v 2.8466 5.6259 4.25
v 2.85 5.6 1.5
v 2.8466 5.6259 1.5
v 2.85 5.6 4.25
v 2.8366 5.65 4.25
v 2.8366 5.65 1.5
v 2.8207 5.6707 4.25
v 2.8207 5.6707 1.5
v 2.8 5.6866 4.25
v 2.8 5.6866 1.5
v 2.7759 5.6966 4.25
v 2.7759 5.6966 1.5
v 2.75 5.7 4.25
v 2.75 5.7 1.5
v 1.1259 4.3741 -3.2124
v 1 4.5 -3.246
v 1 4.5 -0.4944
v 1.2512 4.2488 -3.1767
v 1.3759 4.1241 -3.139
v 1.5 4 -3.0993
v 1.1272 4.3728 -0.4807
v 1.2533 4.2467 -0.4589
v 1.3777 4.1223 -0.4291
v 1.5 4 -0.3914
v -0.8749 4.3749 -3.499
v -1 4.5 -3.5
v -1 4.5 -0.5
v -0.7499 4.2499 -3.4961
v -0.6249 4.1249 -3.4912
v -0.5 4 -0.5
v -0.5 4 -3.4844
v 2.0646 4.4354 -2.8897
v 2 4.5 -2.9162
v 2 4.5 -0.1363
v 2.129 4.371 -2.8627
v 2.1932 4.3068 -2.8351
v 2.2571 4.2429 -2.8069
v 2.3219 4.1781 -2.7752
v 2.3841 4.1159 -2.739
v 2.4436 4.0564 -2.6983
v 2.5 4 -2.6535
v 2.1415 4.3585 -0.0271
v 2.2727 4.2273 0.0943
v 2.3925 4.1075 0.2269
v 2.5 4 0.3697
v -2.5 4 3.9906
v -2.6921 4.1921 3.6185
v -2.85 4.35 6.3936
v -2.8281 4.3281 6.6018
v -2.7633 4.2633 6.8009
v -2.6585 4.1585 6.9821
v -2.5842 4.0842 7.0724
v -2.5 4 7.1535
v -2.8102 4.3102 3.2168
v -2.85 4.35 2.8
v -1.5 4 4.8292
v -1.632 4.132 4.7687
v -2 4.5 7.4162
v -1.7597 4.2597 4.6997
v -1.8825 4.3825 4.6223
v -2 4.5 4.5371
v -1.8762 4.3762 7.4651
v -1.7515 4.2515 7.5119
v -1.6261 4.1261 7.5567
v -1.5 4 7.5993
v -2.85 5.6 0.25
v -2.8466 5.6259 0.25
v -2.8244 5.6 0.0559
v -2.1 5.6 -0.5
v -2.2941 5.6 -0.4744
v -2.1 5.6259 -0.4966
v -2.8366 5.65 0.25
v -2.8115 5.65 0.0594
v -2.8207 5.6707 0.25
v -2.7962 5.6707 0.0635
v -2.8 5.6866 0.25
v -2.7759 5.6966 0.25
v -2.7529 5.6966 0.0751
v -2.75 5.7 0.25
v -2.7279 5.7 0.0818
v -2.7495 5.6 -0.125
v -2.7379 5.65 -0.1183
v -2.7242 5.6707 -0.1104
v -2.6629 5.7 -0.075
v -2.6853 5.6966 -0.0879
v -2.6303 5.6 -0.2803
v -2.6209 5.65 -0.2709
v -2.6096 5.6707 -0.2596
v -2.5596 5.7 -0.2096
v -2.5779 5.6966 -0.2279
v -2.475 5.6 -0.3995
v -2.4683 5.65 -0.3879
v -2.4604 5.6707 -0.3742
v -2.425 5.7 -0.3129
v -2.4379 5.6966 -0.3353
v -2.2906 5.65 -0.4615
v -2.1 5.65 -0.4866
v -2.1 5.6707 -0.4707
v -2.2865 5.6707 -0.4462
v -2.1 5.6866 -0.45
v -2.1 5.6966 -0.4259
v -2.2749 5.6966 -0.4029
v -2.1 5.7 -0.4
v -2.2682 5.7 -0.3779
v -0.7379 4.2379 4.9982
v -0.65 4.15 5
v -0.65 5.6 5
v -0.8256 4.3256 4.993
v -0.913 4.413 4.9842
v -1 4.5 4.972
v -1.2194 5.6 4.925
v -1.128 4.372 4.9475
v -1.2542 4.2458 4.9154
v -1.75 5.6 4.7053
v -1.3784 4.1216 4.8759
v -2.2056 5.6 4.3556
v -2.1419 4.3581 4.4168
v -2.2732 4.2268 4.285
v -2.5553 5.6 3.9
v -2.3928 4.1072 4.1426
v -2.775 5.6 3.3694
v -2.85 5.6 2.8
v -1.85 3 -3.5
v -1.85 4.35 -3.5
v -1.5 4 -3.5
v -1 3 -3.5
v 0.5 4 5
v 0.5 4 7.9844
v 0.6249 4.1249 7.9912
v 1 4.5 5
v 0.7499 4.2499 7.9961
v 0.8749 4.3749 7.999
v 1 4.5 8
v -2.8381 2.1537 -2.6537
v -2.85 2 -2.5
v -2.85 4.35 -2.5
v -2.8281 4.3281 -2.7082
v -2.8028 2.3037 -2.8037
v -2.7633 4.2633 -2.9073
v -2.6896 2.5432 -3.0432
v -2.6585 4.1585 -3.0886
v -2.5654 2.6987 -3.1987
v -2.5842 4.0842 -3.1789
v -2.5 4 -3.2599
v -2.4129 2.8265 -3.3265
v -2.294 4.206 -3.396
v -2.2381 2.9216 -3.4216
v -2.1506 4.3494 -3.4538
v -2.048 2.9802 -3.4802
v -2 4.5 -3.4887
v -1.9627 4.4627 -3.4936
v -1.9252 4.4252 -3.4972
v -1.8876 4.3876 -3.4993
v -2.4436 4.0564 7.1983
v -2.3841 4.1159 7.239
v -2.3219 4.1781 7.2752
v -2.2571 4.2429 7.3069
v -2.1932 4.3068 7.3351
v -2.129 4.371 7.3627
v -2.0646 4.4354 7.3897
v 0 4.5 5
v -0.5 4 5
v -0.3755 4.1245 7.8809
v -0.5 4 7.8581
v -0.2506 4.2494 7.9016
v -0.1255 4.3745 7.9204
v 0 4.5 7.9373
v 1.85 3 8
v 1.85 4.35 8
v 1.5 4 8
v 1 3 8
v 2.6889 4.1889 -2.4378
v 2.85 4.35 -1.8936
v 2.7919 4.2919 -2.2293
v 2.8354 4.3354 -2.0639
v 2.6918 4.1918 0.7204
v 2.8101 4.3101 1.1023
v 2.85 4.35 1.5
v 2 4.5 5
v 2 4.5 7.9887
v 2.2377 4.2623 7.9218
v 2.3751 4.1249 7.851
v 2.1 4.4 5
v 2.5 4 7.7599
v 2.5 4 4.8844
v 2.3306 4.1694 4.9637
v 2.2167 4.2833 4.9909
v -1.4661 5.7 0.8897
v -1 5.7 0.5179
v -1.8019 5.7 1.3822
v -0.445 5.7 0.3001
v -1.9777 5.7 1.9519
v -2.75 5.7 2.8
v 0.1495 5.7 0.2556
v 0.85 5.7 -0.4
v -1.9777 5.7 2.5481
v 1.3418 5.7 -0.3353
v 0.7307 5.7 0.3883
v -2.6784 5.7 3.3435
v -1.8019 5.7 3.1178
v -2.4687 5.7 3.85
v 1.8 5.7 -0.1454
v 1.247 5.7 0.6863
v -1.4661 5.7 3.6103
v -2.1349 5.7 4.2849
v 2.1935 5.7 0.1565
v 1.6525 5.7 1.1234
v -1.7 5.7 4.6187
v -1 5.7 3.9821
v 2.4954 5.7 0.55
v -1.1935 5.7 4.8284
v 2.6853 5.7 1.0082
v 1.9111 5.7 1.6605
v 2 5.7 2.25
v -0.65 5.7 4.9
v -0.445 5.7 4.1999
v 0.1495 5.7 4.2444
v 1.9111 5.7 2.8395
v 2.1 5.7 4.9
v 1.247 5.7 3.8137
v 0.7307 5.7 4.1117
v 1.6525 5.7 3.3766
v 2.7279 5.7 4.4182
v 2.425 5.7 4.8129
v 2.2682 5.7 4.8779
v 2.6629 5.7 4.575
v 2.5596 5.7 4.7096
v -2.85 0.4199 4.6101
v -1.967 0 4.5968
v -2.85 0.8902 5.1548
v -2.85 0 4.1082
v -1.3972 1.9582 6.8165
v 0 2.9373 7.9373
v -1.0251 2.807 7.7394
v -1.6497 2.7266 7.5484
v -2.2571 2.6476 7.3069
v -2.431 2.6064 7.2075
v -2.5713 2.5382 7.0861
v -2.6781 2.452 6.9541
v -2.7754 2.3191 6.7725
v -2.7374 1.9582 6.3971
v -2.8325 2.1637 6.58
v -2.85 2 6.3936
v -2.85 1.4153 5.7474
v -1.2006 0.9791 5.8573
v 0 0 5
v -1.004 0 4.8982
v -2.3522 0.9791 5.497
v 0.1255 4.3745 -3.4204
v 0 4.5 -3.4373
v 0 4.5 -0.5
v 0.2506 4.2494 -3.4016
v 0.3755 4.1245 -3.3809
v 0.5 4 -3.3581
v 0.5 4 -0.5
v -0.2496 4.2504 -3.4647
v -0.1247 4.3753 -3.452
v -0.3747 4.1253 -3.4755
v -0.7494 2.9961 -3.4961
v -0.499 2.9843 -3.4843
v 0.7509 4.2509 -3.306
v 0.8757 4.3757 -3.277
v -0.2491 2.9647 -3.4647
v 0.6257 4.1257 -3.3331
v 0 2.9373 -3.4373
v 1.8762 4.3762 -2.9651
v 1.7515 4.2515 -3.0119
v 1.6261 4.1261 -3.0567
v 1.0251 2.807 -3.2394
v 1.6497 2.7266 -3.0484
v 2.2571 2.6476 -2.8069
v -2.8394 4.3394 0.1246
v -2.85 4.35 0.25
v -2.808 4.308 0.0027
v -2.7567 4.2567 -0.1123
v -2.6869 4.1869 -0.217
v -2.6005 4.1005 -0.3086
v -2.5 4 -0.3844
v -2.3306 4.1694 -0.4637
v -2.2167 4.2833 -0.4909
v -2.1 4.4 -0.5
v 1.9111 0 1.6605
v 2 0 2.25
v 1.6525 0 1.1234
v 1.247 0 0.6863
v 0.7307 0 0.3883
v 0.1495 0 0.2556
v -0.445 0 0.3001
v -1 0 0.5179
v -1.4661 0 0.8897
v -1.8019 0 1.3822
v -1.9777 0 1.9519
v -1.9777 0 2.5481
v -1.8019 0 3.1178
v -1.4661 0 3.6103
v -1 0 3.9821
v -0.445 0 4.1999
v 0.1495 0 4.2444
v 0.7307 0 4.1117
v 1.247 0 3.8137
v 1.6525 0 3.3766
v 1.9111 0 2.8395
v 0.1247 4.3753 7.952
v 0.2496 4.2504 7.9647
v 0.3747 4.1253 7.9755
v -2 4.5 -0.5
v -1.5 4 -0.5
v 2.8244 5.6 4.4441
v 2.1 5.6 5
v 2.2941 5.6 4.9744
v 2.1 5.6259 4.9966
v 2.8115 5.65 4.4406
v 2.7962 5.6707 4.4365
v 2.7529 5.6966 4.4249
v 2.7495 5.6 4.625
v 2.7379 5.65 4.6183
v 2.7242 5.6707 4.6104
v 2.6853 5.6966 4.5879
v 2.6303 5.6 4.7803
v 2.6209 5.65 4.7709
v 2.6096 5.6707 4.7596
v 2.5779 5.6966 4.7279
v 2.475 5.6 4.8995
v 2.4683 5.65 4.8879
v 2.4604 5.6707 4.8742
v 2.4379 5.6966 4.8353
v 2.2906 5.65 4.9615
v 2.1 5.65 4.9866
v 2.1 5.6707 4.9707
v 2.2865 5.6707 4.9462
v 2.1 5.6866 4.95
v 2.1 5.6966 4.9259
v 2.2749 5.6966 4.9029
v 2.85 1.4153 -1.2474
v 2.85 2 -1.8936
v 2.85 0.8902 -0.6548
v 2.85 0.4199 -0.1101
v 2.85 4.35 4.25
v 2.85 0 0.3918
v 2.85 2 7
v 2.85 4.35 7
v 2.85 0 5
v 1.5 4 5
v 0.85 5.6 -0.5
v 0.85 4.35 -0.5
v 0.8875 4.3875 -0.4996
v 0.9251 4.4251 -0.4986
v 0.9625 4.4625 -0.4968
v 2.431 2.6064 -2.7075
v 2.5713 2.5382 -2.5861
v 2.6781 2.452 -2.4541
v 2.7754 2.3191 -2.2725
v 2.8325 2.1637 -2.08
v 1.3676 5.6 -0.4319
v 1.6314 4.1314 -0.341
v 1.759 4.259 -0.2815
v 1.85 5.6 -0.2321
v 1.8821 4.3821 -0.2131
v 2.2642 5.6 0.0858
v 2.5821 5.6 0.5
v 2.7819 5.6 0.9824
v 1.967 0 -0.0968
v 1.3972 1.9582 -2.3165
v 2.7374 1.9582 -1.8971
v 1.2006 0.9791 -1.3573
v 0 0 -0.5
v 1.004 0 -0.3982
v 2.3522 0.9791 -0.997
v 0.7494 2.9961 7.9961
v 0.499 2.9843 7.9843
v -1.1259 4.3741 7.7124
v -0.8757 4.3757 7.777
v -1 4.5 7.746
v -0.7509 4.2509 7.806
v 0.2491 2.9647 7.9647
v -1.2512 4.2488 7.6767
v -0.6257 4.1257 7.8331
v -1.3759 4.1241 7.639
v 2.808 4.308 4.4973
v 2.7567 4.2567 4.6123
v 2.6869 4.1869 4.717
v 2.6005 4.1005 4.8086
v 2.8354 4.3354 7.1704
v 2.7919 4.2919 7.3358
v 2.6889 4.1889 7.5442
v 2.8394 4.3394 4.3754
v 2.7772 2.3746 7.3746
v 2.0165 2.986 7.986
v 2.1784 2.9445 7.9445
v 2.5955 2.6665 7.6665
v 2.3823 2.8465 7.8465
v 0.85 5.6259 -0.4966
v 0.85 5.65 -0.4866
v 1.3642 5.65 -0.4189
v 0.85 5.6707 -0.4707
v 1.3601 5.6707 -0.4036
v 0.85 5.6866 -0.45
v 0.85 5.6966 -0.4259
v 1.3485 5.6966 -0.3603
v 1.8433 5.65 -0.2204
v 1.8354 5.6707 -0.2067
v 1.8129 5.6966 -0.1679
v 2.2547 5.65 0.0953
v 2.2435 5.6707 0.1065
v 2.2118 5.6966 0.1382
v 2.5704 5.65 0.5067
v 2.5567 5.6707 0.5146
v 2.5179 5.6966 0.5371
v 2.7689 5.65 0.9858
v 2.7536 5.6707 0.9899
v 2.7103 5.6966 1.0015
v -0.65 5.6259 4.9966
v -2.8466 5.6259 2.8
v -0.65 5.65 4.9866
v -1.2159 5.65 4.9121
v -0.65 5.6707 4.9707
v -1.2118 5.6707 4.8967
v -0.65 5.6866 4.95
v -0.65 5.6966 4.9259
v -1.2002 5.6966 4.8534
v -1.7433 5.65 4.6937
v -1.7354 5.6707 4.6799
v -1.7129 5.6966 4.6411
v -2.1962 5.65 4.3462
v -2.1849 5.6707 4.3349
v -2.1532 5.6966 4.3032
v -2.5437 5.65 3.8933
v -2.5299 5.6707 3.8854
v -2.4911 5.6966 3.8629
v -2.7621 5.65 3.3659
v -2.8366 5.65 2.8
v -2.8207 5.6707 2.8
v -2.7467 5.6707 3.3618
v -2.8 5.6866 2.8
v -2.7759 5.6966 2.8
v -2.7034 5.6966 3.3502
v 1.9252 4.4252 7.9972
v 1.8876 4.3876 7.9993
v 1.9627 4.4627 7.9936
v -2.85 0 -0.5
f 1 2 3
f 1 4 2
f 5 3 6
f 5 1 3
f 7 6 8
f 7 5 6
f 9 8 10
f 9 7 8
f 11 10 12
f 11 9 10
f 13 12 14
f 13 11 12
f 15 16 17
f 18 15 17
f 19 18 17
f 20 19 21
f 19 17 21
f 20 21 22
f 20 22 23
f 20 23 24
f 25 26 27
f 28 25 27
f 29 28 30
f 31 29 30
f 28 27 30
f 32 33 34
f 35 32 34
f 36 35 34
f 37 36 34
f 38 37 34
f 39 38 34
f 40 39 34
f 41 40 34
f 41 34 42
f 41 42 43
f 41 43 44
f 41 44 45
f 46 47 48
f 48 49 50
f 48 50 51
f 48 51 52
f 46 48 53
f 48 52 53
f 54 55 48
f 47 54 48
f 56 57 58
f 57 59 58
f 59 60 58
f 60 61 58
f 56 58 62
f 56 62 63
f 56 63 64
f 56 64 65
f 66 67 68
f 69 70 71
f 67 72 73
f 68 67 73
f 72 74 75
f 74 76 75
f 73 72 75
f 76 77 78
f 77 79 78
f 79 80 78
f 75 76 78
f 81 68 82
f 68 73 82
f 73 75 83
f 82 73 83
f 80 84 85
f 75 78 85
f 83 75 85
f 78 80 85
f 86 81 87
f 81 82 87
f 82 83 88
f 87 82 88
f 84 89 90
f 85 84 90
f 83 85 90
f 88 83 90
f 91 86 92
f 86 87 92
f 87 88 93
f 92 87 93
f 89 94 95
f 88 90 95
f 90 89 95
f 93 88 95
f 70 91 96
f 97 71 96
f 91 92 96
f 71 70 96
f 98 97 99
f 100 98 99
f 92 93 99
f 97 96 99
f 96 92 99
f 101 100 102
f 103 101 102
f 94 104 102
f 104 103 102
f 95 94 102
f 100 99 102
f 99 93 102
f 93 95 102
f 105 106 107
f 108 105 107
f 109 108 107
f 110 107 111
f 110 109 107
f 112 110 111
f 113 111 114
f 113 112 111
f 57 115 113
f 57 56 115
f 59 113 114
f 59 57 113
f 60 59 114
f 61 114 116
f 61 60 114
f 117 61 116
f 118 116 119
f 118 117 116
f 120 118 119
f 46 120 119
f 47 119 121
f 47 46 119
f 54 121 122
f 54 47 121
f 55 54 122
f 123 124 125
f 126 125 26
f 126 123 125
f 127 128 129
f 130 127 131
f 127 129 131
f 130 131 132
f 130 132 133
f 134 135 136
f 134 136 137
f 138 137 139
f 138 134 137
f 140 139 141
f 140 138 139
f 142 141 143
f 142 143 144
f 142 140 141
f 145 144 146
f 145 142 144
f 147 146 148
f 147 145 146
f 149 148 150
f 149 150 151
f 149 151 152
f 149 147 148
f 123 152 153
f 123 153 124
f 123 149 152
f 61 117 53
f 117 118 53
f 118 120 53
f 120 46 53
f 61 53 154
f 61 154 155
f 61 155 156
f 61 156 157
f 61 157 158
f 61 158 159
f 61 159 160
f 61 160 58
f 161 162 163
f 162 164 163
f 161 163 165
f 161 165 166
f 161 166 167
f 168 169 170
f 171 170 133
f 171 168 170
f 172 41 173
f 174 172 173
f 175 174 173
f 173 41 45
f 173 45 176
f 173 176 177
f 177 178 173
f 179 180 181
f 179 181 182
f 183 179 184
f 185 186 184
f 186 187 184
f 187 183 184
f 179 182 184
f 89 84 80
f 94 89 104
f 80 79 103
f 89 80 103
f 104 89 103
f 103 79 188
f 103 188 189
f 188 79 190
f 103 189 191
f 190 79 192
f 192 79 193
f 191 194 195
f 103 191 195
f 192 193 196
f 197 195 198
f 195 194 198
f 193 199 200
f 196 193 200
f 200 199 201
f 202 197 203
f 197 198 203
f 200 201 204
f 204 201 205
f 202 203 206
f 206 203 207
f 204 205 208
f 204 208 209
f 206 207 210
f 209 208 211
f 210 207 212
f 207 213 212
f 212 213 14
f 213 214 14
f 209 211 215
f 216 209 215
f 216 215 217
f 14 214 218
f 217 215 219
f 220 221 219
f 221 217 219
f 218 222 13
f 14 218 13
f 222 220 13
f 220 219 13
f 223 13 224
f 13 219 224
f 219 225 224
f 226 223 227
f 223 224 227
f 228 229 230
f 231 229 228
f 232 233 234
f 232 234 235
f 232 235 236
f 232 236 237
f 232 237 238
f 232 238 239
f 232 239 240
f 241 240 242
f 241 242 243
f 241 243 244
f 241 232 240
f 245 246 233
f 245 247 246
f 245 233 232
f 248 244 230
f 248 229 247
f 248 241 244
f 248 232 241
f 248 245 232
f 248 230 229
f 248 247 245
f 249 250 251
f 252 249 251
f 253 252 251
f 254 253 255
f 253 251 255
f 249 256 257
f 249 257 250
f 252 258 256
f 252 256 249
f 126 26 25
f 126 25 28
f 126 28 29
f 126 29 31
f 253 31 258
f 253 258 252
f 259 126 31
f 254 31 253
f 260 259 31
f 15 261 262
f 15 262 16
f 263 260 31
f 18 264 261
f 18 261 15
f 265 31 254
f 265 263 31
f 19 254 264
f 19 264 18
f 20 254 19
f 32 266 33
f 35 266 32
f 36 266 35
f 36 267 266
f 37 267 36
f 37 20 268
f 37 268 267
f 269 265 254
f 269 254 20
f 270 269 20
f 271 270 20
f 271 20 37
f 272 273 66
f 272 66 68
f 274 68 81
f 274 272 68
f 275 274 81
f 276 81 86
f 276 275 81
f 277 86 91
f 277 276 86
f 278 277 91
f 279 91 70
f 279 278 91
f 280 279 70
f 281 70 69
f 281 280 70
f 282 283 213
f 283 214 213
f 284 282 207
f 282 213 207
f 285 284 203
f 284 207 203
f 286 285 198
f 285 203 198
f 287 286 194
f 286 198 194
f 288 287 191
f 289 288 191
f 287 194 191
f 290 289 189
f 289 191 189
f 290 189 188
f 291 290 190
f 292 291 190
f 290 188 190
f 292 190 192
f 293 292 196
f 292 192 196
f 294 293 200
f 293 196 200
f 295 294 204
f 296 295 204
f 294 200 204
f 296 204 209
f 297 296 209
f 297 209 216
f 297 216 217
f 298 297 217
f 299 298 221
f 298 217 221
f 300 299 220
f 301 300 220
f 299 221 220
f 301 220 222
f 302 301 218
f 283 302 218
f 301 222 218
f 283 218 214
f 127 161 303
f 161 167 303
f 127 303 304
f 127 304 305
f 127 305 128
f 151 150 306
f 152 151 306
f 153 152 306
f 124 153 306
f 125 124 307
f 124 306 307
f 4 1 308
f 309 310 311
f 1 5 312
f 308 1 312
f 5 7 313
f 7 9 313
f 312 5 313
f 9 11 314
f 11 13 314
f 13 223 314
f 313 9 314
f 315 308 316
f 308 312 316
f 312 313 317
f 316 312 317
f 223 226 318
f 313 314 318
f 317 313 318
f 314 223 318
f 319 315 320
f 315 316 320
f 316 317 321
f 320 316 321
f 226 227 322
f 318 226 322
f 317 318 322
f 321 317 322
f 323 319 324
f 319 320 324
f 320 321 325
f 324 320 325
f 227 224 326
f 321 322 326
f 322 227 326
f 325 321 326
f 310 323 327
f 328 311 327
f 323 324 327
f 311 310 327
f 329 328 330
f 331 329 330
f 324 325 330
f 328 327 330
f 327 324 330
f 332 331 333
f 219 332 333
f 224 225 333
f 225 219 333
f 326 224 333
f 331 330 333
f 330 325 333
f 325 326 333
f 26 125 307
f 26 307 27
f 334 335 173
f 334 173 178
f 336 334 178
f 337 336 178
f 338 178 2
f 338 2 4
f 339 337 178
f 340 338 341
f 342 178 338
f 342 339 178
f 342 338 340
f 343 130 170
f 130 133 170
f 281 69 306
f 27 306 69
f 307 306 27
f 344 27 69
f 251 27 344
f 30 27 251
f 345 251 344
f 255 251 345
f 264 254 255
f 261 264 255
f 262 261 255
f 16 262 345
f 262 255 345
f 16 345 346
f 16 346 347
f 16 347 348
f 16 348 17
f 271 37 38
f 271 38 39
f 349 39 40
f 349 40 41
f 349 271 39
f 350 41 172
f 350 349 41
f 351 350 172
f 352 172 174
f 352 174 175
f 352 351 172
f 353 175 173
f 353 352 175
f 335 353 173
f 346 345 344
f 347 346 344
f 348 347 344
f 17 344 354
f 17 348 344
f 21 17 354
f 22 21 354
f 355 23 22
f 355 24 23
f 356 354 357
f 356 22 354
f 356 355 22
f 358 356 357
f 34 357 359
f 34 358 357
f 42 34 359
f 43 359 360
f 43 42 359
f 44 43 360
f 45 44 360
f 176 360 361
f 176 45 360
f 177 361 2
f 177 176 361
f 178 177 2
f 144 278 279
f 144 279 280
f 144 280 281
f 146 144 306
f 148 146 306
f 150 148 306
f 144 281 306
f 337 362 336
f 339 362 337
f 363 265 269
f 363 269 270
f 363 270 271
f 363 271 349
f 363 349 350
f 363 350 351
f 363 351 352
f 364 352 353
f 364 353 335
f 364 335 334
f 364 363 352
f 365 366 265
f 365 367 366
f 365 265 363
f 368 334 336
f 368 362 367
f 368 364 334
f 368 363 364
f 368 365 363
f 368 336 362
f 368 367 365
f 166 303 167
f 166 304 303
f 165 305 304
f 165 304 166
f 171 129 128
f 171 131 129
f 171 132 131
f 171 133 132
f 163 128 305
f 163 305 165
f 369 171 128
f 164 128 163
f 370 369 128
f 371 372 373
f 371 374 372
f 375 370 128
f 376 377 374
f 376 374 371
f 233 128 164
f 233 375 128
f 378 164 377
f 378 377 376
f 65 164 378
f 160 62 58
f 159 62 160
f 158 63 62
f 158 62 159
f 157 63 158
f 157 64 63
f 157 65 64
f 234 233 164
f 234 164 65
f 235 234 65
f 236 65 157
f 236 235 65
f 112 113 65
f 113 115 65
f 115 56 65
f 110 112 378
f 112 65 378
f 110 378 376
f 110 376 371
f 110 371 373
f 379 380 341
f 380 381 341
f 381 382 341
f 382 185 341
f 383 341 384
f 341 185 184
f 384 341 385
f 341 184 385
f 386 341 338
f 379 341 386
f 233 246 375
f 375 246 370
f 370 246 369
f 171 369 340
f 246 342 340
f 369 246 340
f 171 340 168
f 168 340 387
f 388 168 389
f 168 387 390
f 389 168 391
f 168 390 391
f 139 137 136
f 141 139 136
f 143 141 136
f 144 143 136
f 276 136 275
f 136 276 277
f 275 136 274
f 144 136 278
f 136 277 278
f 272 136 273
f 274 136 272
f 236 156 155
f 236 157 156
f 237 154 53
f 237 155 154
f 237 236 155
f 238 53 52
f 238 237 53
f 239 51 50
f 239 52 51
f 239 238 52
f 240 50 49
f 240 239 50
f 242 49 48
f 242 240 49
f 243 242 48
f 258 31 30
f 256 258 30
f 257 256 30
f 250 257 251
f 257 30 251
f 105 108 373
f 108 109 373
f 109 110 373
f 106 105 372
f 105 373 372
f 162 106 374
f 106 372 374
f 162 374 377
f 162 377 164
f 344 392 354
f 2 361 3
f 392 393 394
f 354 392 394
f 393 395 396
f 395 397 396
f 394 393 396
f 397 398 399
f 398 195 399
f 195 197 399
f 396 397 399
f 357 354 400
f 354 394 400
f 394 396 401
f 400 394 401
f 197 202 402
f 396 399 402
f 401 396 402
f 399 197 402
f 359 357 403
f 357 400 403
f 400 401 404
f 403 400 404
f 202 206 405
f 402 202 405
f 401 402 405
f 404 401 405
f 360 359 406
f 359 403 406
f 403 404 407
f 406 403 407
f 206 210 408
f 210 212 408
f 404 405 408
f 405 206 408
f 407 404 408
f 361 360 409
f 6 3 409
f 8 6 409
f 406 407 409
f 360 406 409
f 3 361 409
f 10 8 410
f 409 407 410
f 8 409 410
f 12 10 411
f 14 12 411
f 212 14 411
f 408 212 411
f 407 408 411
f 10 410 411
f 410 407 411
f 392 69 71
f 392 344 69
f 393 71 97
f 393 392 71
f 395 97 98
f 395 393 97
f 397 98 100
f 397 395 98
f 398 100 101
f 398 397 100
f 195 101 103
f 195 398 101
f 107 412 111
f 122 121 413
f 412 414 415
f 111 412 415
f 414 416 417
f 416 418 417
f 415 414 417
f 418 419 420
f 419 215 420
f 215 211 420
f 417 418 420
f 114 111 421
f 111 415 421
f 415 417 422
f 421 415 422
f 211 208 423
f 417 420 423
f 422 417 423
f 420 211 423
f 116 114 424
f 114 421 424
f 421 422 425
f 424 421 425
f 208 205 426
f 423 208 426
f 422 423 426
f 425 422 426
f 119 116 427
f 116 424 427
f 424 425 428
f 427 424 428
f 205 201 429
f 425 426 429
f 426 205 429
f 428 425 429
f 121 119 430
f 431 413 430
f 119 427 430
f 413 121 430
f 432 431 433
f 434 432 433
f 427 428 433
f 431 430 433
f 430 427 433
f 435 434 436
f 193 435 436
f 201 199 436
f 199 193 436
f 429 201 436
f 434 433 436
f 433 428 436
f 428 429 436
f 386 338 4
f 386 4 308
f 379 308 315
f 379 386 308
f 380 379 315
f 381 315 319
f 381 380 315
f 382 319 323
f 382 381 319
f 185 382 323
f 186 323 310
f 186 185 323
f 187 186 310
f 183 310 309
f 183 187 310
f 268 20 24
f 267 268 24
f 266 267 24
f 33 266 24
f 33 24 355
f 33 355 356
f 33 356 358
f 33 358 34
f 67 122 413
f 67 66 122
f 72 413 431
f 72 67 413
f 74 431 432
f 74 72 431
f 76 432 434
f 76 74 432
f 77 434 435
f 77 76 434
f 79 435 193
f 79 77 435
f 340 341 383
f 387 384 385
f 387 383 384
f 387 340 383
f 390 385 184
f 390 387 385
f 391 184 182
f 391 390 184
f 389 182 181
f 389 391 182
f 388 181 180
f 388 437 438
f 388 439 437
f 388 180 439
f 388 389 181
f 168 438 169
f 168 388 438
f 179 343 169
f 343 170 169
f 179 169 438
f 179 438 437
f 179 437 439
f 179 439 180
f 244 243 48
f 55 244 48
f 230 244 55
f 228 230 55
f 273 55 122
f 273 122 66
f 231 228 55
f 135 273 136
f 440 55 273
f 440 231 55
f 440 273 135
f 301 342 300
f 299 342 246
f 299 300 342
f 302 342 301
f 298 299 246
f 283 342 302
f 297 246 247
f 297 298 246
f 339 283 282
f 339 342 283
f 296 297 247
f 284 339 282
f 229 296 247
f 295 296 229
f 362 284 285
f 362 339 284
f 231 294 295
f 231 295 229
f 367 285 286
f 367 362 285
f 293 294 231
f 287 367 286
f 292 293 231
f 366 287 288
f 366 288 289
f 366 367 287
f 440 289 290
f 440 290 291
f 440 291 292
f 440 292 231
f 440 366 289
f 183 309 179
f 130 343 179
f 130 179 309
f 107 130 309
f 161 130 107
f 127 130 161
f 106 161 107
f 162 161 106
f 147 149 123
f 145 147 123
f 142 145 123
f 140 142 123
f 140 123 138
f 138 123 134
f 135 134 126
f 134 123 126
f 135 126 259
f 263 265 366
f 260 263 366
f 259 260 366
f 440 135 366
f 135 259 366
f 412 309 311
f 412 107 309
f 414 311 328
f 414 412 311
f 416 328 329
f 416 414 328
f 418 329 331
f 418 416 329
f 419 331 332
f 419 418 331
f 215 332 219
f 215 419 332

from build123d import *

# Parameters (mm, degrees)
EXTRUDE1_DEPTH          = 4.5
CUT_EXTRUDE1_DEPTH      = 8
CUT_EXTRUDE1_DEPTH_BACK = 8
CUT_EXTRUDE2_DEPTH      = 4
CUT_EXTRUDE2_DEPTH_BACK = 4
CUT_REVOLVE1_ANGLE      = 60
CUT_REVOLVE2_ANGLE      = 60
EXTRUDE2_START          = -0.2
SKETCH7_R               = 2
EXTRUDE2_DEPTH          = 5.5
SKETCH10_R              = 2
CUT_EXTRUDE4_DEPTH      = 11.228025387
FILLET1_R               = 0.1


with BuildPart() as part:
    # Sketch1 → Extrude1 (new body)
    with BuildSketch(Plane(origin=(0, 0, 0), x_dir=(1, 0, 0), z_dir=(0, 1, 0))):
        with BuildLine():
            Line((-1.85, 3.5), (-1, 3.5))
            ThreePointArc((-1, 3.5), (0.66503344, 3.324810774), (2.2571429, 2.806915911))
            ThreePointArc((2.2571429, 2.806915911), (2.688791661, 2.438003962), (2.85, 1.893551439))
            Line((2.85, 1.893551439), (2.85, -1.946775719))
            Line((2.85, -1.946775719), (2.85, -7))
            ThreePointArc((2.85, -7), (2.557106781, -7.707106781), (1.85, -8))
            Line((1.85, -8), (1, -8))
            ThreePointArc((1, -8), (-0.66503344, -7.824810774), (-2.2571429, -7.306915911))
            ThreePointArc((-2.2571429, -7.306915911), (-2.688791661, -6.938003962), (-2.85, -6.393551439))
            Line((-2.85, -6.393551439), (-2.85, -1.946775719))
            Line((-2.85, -1.946775719), (-2.85, 2.5))
            ThreePointArc((-2.85, 2.5), (-2.557106781, 3.207106781), (-1.85, 3.5))
        make_face()
    extrude(amount=EXTRUDE1_DEPTH)

    # Sketch2 → Cut-Extrude1 (cut, two sides: drawn at the far end of the back side and taken through both)
    with BuildSketch(Plane.XY.offset(-CUT_EXTRUDE1_DEPTH_BACK)):
        Polygon((-4, 4.5), (-3.5, 4), (-3, 4.5), (-2.5, 4), (-2, 4.5), (-1.5, 4), (-1, 4.5), (-0.5, 4), (0, 4.5), (0.5, 4), (1, 4.5), (1.5, 4), (2, 4.5), (2.5, 4), (3, 4.5), (3.5, 4), (4, 4.5), (4, 5.5), (-4, 5.5), align=None)
    extrude(amount=CUT_EXTRUDE1_DEPTH + CUT_EXTRUDE1_DEPTH_BACK, mode=Mode.SUBTRACT)

    # Sketch4 → Cut-Extrude2 (cut, two sides: drawn at the far end of the back side and taken through both)
    with BuildSketch(Plane(origin=(0, 0, 0), x_dir=(0, 0, -1), z_dir=(1, 0, 0)).offset(-CUT_EXTRUDE2_DEPTH_BACK)):
        Polygon((4.5, -1), (4.5, 4), (0.5, 0), (-5, 0), (-9, 4), (-9, -1), align=None)
    extrude(amount=CUT_EXTRUDE2_DEPTH + CUT_EXTRUDE2_DEPTH_BACK, mode=Mode.SUBTRACT)

    # Sketch5 → Cut-Revolve1 (revolve, cut)
    with BuildSketch(Plane(origin=(0, 0, 0), x_dir=(0, 0, -1), z_dir=(1, 0, 0))):
        Polygon((0, -1), (-9, -1), (-9, 3), (-8, 3), (-5, 0), (0, 0), align=None)
    revolve(axis=Axis((0, 3, 0), (0, -1, 0)), revolution_arc=CUT_REVOLVE1_ANGLE, mode=Mode.SUBTRACT)

    # Sketch6 → Cut-Revolve2 (revolve, cut)
    with BuildSketch(Plane(origin=(0, 0, 0), x_dir=(0, 0, -1), z_dir=(1, 0, 0))):
        Polygon((4.5, -1), (4.5, 3), (3.5, 3), (0.5, 0), (-4.5, 0), (-4.5, -1), align=None)
    revolve(axis=Axis((0, 3, 4.5), (0, -1, 0)), revolution_arc=CUT_REVOLVE2_ANGLE, mode=Mode.SUBTRACT)

    # Sketch7 → Extrude2 (add)
    with BuildSketch(Plane.XZ.offset(EXTRUDE2_START)):
        with BuildLine():
            Line((2.1, 5), (-0.65, 5))
            ThreePointArc((-0.65, 5), (-2.205634919, 4.355634919), (-2.85, 2.8))
            Line((-2.85, 2.8), (-2.85, 0.25))
            ThreePointArc((-2.85, 0.25), (-2.630330086, -0.280330086), (-2.1, -0.5))
            Line((-2.1, -0.5), (0.85, -0.5))
            ThreePointArc((0.85, -0.5), (2.264213562, 0.085786438), (2.85, 1.5))
            Line((2.85, 1.5), (2.85, 4.25))
            ThreePointArc((2.85, 4.25), (2.630330086, 4.780330086), (2.1, 5))
        make_face()
        with Locations((0, 2.25)):
            Circle(SKETCH7_R, mode=Mode.SUBTRACT)
    extrude(amount=-EXTRUDE2_DEPTH)

    # Sketch10 → Cut-Extrude4 (cut, through all)
    with BuildSketch(Plane(origin=(0, 5.7, 0), x_dir=(1, 0, 0), z_dir=(0, 1, 0))):
        with Locations((0, -2.25)):
            Circle(SKETCH10_R)
    extrude(amount=-CUT_EXTRUDE4_DEPTH, mode=Mode.SUBTRACT)

    # Fillet1
    fillet1_edges = [part.edges().sort_by_distance(p)[0] for p in [
        (-0.625, 5.7, -0.5),
        (-2.630330086, 5.7, -0.280330086),
        (-2.85, 5.7, 1.525),
        (-2.205634919, 5.7, 4.355634919),
        (0.725, 5.7, 5),
        (2.630330086, 5.7, 4.780330086),
        (2.85, 5.7, 2.875),
        (2.264213562, 5.7, 0.085786438),
    ]]
    fillet(fillet1_edges, radius=FILLET1_R)


solid = part.part
